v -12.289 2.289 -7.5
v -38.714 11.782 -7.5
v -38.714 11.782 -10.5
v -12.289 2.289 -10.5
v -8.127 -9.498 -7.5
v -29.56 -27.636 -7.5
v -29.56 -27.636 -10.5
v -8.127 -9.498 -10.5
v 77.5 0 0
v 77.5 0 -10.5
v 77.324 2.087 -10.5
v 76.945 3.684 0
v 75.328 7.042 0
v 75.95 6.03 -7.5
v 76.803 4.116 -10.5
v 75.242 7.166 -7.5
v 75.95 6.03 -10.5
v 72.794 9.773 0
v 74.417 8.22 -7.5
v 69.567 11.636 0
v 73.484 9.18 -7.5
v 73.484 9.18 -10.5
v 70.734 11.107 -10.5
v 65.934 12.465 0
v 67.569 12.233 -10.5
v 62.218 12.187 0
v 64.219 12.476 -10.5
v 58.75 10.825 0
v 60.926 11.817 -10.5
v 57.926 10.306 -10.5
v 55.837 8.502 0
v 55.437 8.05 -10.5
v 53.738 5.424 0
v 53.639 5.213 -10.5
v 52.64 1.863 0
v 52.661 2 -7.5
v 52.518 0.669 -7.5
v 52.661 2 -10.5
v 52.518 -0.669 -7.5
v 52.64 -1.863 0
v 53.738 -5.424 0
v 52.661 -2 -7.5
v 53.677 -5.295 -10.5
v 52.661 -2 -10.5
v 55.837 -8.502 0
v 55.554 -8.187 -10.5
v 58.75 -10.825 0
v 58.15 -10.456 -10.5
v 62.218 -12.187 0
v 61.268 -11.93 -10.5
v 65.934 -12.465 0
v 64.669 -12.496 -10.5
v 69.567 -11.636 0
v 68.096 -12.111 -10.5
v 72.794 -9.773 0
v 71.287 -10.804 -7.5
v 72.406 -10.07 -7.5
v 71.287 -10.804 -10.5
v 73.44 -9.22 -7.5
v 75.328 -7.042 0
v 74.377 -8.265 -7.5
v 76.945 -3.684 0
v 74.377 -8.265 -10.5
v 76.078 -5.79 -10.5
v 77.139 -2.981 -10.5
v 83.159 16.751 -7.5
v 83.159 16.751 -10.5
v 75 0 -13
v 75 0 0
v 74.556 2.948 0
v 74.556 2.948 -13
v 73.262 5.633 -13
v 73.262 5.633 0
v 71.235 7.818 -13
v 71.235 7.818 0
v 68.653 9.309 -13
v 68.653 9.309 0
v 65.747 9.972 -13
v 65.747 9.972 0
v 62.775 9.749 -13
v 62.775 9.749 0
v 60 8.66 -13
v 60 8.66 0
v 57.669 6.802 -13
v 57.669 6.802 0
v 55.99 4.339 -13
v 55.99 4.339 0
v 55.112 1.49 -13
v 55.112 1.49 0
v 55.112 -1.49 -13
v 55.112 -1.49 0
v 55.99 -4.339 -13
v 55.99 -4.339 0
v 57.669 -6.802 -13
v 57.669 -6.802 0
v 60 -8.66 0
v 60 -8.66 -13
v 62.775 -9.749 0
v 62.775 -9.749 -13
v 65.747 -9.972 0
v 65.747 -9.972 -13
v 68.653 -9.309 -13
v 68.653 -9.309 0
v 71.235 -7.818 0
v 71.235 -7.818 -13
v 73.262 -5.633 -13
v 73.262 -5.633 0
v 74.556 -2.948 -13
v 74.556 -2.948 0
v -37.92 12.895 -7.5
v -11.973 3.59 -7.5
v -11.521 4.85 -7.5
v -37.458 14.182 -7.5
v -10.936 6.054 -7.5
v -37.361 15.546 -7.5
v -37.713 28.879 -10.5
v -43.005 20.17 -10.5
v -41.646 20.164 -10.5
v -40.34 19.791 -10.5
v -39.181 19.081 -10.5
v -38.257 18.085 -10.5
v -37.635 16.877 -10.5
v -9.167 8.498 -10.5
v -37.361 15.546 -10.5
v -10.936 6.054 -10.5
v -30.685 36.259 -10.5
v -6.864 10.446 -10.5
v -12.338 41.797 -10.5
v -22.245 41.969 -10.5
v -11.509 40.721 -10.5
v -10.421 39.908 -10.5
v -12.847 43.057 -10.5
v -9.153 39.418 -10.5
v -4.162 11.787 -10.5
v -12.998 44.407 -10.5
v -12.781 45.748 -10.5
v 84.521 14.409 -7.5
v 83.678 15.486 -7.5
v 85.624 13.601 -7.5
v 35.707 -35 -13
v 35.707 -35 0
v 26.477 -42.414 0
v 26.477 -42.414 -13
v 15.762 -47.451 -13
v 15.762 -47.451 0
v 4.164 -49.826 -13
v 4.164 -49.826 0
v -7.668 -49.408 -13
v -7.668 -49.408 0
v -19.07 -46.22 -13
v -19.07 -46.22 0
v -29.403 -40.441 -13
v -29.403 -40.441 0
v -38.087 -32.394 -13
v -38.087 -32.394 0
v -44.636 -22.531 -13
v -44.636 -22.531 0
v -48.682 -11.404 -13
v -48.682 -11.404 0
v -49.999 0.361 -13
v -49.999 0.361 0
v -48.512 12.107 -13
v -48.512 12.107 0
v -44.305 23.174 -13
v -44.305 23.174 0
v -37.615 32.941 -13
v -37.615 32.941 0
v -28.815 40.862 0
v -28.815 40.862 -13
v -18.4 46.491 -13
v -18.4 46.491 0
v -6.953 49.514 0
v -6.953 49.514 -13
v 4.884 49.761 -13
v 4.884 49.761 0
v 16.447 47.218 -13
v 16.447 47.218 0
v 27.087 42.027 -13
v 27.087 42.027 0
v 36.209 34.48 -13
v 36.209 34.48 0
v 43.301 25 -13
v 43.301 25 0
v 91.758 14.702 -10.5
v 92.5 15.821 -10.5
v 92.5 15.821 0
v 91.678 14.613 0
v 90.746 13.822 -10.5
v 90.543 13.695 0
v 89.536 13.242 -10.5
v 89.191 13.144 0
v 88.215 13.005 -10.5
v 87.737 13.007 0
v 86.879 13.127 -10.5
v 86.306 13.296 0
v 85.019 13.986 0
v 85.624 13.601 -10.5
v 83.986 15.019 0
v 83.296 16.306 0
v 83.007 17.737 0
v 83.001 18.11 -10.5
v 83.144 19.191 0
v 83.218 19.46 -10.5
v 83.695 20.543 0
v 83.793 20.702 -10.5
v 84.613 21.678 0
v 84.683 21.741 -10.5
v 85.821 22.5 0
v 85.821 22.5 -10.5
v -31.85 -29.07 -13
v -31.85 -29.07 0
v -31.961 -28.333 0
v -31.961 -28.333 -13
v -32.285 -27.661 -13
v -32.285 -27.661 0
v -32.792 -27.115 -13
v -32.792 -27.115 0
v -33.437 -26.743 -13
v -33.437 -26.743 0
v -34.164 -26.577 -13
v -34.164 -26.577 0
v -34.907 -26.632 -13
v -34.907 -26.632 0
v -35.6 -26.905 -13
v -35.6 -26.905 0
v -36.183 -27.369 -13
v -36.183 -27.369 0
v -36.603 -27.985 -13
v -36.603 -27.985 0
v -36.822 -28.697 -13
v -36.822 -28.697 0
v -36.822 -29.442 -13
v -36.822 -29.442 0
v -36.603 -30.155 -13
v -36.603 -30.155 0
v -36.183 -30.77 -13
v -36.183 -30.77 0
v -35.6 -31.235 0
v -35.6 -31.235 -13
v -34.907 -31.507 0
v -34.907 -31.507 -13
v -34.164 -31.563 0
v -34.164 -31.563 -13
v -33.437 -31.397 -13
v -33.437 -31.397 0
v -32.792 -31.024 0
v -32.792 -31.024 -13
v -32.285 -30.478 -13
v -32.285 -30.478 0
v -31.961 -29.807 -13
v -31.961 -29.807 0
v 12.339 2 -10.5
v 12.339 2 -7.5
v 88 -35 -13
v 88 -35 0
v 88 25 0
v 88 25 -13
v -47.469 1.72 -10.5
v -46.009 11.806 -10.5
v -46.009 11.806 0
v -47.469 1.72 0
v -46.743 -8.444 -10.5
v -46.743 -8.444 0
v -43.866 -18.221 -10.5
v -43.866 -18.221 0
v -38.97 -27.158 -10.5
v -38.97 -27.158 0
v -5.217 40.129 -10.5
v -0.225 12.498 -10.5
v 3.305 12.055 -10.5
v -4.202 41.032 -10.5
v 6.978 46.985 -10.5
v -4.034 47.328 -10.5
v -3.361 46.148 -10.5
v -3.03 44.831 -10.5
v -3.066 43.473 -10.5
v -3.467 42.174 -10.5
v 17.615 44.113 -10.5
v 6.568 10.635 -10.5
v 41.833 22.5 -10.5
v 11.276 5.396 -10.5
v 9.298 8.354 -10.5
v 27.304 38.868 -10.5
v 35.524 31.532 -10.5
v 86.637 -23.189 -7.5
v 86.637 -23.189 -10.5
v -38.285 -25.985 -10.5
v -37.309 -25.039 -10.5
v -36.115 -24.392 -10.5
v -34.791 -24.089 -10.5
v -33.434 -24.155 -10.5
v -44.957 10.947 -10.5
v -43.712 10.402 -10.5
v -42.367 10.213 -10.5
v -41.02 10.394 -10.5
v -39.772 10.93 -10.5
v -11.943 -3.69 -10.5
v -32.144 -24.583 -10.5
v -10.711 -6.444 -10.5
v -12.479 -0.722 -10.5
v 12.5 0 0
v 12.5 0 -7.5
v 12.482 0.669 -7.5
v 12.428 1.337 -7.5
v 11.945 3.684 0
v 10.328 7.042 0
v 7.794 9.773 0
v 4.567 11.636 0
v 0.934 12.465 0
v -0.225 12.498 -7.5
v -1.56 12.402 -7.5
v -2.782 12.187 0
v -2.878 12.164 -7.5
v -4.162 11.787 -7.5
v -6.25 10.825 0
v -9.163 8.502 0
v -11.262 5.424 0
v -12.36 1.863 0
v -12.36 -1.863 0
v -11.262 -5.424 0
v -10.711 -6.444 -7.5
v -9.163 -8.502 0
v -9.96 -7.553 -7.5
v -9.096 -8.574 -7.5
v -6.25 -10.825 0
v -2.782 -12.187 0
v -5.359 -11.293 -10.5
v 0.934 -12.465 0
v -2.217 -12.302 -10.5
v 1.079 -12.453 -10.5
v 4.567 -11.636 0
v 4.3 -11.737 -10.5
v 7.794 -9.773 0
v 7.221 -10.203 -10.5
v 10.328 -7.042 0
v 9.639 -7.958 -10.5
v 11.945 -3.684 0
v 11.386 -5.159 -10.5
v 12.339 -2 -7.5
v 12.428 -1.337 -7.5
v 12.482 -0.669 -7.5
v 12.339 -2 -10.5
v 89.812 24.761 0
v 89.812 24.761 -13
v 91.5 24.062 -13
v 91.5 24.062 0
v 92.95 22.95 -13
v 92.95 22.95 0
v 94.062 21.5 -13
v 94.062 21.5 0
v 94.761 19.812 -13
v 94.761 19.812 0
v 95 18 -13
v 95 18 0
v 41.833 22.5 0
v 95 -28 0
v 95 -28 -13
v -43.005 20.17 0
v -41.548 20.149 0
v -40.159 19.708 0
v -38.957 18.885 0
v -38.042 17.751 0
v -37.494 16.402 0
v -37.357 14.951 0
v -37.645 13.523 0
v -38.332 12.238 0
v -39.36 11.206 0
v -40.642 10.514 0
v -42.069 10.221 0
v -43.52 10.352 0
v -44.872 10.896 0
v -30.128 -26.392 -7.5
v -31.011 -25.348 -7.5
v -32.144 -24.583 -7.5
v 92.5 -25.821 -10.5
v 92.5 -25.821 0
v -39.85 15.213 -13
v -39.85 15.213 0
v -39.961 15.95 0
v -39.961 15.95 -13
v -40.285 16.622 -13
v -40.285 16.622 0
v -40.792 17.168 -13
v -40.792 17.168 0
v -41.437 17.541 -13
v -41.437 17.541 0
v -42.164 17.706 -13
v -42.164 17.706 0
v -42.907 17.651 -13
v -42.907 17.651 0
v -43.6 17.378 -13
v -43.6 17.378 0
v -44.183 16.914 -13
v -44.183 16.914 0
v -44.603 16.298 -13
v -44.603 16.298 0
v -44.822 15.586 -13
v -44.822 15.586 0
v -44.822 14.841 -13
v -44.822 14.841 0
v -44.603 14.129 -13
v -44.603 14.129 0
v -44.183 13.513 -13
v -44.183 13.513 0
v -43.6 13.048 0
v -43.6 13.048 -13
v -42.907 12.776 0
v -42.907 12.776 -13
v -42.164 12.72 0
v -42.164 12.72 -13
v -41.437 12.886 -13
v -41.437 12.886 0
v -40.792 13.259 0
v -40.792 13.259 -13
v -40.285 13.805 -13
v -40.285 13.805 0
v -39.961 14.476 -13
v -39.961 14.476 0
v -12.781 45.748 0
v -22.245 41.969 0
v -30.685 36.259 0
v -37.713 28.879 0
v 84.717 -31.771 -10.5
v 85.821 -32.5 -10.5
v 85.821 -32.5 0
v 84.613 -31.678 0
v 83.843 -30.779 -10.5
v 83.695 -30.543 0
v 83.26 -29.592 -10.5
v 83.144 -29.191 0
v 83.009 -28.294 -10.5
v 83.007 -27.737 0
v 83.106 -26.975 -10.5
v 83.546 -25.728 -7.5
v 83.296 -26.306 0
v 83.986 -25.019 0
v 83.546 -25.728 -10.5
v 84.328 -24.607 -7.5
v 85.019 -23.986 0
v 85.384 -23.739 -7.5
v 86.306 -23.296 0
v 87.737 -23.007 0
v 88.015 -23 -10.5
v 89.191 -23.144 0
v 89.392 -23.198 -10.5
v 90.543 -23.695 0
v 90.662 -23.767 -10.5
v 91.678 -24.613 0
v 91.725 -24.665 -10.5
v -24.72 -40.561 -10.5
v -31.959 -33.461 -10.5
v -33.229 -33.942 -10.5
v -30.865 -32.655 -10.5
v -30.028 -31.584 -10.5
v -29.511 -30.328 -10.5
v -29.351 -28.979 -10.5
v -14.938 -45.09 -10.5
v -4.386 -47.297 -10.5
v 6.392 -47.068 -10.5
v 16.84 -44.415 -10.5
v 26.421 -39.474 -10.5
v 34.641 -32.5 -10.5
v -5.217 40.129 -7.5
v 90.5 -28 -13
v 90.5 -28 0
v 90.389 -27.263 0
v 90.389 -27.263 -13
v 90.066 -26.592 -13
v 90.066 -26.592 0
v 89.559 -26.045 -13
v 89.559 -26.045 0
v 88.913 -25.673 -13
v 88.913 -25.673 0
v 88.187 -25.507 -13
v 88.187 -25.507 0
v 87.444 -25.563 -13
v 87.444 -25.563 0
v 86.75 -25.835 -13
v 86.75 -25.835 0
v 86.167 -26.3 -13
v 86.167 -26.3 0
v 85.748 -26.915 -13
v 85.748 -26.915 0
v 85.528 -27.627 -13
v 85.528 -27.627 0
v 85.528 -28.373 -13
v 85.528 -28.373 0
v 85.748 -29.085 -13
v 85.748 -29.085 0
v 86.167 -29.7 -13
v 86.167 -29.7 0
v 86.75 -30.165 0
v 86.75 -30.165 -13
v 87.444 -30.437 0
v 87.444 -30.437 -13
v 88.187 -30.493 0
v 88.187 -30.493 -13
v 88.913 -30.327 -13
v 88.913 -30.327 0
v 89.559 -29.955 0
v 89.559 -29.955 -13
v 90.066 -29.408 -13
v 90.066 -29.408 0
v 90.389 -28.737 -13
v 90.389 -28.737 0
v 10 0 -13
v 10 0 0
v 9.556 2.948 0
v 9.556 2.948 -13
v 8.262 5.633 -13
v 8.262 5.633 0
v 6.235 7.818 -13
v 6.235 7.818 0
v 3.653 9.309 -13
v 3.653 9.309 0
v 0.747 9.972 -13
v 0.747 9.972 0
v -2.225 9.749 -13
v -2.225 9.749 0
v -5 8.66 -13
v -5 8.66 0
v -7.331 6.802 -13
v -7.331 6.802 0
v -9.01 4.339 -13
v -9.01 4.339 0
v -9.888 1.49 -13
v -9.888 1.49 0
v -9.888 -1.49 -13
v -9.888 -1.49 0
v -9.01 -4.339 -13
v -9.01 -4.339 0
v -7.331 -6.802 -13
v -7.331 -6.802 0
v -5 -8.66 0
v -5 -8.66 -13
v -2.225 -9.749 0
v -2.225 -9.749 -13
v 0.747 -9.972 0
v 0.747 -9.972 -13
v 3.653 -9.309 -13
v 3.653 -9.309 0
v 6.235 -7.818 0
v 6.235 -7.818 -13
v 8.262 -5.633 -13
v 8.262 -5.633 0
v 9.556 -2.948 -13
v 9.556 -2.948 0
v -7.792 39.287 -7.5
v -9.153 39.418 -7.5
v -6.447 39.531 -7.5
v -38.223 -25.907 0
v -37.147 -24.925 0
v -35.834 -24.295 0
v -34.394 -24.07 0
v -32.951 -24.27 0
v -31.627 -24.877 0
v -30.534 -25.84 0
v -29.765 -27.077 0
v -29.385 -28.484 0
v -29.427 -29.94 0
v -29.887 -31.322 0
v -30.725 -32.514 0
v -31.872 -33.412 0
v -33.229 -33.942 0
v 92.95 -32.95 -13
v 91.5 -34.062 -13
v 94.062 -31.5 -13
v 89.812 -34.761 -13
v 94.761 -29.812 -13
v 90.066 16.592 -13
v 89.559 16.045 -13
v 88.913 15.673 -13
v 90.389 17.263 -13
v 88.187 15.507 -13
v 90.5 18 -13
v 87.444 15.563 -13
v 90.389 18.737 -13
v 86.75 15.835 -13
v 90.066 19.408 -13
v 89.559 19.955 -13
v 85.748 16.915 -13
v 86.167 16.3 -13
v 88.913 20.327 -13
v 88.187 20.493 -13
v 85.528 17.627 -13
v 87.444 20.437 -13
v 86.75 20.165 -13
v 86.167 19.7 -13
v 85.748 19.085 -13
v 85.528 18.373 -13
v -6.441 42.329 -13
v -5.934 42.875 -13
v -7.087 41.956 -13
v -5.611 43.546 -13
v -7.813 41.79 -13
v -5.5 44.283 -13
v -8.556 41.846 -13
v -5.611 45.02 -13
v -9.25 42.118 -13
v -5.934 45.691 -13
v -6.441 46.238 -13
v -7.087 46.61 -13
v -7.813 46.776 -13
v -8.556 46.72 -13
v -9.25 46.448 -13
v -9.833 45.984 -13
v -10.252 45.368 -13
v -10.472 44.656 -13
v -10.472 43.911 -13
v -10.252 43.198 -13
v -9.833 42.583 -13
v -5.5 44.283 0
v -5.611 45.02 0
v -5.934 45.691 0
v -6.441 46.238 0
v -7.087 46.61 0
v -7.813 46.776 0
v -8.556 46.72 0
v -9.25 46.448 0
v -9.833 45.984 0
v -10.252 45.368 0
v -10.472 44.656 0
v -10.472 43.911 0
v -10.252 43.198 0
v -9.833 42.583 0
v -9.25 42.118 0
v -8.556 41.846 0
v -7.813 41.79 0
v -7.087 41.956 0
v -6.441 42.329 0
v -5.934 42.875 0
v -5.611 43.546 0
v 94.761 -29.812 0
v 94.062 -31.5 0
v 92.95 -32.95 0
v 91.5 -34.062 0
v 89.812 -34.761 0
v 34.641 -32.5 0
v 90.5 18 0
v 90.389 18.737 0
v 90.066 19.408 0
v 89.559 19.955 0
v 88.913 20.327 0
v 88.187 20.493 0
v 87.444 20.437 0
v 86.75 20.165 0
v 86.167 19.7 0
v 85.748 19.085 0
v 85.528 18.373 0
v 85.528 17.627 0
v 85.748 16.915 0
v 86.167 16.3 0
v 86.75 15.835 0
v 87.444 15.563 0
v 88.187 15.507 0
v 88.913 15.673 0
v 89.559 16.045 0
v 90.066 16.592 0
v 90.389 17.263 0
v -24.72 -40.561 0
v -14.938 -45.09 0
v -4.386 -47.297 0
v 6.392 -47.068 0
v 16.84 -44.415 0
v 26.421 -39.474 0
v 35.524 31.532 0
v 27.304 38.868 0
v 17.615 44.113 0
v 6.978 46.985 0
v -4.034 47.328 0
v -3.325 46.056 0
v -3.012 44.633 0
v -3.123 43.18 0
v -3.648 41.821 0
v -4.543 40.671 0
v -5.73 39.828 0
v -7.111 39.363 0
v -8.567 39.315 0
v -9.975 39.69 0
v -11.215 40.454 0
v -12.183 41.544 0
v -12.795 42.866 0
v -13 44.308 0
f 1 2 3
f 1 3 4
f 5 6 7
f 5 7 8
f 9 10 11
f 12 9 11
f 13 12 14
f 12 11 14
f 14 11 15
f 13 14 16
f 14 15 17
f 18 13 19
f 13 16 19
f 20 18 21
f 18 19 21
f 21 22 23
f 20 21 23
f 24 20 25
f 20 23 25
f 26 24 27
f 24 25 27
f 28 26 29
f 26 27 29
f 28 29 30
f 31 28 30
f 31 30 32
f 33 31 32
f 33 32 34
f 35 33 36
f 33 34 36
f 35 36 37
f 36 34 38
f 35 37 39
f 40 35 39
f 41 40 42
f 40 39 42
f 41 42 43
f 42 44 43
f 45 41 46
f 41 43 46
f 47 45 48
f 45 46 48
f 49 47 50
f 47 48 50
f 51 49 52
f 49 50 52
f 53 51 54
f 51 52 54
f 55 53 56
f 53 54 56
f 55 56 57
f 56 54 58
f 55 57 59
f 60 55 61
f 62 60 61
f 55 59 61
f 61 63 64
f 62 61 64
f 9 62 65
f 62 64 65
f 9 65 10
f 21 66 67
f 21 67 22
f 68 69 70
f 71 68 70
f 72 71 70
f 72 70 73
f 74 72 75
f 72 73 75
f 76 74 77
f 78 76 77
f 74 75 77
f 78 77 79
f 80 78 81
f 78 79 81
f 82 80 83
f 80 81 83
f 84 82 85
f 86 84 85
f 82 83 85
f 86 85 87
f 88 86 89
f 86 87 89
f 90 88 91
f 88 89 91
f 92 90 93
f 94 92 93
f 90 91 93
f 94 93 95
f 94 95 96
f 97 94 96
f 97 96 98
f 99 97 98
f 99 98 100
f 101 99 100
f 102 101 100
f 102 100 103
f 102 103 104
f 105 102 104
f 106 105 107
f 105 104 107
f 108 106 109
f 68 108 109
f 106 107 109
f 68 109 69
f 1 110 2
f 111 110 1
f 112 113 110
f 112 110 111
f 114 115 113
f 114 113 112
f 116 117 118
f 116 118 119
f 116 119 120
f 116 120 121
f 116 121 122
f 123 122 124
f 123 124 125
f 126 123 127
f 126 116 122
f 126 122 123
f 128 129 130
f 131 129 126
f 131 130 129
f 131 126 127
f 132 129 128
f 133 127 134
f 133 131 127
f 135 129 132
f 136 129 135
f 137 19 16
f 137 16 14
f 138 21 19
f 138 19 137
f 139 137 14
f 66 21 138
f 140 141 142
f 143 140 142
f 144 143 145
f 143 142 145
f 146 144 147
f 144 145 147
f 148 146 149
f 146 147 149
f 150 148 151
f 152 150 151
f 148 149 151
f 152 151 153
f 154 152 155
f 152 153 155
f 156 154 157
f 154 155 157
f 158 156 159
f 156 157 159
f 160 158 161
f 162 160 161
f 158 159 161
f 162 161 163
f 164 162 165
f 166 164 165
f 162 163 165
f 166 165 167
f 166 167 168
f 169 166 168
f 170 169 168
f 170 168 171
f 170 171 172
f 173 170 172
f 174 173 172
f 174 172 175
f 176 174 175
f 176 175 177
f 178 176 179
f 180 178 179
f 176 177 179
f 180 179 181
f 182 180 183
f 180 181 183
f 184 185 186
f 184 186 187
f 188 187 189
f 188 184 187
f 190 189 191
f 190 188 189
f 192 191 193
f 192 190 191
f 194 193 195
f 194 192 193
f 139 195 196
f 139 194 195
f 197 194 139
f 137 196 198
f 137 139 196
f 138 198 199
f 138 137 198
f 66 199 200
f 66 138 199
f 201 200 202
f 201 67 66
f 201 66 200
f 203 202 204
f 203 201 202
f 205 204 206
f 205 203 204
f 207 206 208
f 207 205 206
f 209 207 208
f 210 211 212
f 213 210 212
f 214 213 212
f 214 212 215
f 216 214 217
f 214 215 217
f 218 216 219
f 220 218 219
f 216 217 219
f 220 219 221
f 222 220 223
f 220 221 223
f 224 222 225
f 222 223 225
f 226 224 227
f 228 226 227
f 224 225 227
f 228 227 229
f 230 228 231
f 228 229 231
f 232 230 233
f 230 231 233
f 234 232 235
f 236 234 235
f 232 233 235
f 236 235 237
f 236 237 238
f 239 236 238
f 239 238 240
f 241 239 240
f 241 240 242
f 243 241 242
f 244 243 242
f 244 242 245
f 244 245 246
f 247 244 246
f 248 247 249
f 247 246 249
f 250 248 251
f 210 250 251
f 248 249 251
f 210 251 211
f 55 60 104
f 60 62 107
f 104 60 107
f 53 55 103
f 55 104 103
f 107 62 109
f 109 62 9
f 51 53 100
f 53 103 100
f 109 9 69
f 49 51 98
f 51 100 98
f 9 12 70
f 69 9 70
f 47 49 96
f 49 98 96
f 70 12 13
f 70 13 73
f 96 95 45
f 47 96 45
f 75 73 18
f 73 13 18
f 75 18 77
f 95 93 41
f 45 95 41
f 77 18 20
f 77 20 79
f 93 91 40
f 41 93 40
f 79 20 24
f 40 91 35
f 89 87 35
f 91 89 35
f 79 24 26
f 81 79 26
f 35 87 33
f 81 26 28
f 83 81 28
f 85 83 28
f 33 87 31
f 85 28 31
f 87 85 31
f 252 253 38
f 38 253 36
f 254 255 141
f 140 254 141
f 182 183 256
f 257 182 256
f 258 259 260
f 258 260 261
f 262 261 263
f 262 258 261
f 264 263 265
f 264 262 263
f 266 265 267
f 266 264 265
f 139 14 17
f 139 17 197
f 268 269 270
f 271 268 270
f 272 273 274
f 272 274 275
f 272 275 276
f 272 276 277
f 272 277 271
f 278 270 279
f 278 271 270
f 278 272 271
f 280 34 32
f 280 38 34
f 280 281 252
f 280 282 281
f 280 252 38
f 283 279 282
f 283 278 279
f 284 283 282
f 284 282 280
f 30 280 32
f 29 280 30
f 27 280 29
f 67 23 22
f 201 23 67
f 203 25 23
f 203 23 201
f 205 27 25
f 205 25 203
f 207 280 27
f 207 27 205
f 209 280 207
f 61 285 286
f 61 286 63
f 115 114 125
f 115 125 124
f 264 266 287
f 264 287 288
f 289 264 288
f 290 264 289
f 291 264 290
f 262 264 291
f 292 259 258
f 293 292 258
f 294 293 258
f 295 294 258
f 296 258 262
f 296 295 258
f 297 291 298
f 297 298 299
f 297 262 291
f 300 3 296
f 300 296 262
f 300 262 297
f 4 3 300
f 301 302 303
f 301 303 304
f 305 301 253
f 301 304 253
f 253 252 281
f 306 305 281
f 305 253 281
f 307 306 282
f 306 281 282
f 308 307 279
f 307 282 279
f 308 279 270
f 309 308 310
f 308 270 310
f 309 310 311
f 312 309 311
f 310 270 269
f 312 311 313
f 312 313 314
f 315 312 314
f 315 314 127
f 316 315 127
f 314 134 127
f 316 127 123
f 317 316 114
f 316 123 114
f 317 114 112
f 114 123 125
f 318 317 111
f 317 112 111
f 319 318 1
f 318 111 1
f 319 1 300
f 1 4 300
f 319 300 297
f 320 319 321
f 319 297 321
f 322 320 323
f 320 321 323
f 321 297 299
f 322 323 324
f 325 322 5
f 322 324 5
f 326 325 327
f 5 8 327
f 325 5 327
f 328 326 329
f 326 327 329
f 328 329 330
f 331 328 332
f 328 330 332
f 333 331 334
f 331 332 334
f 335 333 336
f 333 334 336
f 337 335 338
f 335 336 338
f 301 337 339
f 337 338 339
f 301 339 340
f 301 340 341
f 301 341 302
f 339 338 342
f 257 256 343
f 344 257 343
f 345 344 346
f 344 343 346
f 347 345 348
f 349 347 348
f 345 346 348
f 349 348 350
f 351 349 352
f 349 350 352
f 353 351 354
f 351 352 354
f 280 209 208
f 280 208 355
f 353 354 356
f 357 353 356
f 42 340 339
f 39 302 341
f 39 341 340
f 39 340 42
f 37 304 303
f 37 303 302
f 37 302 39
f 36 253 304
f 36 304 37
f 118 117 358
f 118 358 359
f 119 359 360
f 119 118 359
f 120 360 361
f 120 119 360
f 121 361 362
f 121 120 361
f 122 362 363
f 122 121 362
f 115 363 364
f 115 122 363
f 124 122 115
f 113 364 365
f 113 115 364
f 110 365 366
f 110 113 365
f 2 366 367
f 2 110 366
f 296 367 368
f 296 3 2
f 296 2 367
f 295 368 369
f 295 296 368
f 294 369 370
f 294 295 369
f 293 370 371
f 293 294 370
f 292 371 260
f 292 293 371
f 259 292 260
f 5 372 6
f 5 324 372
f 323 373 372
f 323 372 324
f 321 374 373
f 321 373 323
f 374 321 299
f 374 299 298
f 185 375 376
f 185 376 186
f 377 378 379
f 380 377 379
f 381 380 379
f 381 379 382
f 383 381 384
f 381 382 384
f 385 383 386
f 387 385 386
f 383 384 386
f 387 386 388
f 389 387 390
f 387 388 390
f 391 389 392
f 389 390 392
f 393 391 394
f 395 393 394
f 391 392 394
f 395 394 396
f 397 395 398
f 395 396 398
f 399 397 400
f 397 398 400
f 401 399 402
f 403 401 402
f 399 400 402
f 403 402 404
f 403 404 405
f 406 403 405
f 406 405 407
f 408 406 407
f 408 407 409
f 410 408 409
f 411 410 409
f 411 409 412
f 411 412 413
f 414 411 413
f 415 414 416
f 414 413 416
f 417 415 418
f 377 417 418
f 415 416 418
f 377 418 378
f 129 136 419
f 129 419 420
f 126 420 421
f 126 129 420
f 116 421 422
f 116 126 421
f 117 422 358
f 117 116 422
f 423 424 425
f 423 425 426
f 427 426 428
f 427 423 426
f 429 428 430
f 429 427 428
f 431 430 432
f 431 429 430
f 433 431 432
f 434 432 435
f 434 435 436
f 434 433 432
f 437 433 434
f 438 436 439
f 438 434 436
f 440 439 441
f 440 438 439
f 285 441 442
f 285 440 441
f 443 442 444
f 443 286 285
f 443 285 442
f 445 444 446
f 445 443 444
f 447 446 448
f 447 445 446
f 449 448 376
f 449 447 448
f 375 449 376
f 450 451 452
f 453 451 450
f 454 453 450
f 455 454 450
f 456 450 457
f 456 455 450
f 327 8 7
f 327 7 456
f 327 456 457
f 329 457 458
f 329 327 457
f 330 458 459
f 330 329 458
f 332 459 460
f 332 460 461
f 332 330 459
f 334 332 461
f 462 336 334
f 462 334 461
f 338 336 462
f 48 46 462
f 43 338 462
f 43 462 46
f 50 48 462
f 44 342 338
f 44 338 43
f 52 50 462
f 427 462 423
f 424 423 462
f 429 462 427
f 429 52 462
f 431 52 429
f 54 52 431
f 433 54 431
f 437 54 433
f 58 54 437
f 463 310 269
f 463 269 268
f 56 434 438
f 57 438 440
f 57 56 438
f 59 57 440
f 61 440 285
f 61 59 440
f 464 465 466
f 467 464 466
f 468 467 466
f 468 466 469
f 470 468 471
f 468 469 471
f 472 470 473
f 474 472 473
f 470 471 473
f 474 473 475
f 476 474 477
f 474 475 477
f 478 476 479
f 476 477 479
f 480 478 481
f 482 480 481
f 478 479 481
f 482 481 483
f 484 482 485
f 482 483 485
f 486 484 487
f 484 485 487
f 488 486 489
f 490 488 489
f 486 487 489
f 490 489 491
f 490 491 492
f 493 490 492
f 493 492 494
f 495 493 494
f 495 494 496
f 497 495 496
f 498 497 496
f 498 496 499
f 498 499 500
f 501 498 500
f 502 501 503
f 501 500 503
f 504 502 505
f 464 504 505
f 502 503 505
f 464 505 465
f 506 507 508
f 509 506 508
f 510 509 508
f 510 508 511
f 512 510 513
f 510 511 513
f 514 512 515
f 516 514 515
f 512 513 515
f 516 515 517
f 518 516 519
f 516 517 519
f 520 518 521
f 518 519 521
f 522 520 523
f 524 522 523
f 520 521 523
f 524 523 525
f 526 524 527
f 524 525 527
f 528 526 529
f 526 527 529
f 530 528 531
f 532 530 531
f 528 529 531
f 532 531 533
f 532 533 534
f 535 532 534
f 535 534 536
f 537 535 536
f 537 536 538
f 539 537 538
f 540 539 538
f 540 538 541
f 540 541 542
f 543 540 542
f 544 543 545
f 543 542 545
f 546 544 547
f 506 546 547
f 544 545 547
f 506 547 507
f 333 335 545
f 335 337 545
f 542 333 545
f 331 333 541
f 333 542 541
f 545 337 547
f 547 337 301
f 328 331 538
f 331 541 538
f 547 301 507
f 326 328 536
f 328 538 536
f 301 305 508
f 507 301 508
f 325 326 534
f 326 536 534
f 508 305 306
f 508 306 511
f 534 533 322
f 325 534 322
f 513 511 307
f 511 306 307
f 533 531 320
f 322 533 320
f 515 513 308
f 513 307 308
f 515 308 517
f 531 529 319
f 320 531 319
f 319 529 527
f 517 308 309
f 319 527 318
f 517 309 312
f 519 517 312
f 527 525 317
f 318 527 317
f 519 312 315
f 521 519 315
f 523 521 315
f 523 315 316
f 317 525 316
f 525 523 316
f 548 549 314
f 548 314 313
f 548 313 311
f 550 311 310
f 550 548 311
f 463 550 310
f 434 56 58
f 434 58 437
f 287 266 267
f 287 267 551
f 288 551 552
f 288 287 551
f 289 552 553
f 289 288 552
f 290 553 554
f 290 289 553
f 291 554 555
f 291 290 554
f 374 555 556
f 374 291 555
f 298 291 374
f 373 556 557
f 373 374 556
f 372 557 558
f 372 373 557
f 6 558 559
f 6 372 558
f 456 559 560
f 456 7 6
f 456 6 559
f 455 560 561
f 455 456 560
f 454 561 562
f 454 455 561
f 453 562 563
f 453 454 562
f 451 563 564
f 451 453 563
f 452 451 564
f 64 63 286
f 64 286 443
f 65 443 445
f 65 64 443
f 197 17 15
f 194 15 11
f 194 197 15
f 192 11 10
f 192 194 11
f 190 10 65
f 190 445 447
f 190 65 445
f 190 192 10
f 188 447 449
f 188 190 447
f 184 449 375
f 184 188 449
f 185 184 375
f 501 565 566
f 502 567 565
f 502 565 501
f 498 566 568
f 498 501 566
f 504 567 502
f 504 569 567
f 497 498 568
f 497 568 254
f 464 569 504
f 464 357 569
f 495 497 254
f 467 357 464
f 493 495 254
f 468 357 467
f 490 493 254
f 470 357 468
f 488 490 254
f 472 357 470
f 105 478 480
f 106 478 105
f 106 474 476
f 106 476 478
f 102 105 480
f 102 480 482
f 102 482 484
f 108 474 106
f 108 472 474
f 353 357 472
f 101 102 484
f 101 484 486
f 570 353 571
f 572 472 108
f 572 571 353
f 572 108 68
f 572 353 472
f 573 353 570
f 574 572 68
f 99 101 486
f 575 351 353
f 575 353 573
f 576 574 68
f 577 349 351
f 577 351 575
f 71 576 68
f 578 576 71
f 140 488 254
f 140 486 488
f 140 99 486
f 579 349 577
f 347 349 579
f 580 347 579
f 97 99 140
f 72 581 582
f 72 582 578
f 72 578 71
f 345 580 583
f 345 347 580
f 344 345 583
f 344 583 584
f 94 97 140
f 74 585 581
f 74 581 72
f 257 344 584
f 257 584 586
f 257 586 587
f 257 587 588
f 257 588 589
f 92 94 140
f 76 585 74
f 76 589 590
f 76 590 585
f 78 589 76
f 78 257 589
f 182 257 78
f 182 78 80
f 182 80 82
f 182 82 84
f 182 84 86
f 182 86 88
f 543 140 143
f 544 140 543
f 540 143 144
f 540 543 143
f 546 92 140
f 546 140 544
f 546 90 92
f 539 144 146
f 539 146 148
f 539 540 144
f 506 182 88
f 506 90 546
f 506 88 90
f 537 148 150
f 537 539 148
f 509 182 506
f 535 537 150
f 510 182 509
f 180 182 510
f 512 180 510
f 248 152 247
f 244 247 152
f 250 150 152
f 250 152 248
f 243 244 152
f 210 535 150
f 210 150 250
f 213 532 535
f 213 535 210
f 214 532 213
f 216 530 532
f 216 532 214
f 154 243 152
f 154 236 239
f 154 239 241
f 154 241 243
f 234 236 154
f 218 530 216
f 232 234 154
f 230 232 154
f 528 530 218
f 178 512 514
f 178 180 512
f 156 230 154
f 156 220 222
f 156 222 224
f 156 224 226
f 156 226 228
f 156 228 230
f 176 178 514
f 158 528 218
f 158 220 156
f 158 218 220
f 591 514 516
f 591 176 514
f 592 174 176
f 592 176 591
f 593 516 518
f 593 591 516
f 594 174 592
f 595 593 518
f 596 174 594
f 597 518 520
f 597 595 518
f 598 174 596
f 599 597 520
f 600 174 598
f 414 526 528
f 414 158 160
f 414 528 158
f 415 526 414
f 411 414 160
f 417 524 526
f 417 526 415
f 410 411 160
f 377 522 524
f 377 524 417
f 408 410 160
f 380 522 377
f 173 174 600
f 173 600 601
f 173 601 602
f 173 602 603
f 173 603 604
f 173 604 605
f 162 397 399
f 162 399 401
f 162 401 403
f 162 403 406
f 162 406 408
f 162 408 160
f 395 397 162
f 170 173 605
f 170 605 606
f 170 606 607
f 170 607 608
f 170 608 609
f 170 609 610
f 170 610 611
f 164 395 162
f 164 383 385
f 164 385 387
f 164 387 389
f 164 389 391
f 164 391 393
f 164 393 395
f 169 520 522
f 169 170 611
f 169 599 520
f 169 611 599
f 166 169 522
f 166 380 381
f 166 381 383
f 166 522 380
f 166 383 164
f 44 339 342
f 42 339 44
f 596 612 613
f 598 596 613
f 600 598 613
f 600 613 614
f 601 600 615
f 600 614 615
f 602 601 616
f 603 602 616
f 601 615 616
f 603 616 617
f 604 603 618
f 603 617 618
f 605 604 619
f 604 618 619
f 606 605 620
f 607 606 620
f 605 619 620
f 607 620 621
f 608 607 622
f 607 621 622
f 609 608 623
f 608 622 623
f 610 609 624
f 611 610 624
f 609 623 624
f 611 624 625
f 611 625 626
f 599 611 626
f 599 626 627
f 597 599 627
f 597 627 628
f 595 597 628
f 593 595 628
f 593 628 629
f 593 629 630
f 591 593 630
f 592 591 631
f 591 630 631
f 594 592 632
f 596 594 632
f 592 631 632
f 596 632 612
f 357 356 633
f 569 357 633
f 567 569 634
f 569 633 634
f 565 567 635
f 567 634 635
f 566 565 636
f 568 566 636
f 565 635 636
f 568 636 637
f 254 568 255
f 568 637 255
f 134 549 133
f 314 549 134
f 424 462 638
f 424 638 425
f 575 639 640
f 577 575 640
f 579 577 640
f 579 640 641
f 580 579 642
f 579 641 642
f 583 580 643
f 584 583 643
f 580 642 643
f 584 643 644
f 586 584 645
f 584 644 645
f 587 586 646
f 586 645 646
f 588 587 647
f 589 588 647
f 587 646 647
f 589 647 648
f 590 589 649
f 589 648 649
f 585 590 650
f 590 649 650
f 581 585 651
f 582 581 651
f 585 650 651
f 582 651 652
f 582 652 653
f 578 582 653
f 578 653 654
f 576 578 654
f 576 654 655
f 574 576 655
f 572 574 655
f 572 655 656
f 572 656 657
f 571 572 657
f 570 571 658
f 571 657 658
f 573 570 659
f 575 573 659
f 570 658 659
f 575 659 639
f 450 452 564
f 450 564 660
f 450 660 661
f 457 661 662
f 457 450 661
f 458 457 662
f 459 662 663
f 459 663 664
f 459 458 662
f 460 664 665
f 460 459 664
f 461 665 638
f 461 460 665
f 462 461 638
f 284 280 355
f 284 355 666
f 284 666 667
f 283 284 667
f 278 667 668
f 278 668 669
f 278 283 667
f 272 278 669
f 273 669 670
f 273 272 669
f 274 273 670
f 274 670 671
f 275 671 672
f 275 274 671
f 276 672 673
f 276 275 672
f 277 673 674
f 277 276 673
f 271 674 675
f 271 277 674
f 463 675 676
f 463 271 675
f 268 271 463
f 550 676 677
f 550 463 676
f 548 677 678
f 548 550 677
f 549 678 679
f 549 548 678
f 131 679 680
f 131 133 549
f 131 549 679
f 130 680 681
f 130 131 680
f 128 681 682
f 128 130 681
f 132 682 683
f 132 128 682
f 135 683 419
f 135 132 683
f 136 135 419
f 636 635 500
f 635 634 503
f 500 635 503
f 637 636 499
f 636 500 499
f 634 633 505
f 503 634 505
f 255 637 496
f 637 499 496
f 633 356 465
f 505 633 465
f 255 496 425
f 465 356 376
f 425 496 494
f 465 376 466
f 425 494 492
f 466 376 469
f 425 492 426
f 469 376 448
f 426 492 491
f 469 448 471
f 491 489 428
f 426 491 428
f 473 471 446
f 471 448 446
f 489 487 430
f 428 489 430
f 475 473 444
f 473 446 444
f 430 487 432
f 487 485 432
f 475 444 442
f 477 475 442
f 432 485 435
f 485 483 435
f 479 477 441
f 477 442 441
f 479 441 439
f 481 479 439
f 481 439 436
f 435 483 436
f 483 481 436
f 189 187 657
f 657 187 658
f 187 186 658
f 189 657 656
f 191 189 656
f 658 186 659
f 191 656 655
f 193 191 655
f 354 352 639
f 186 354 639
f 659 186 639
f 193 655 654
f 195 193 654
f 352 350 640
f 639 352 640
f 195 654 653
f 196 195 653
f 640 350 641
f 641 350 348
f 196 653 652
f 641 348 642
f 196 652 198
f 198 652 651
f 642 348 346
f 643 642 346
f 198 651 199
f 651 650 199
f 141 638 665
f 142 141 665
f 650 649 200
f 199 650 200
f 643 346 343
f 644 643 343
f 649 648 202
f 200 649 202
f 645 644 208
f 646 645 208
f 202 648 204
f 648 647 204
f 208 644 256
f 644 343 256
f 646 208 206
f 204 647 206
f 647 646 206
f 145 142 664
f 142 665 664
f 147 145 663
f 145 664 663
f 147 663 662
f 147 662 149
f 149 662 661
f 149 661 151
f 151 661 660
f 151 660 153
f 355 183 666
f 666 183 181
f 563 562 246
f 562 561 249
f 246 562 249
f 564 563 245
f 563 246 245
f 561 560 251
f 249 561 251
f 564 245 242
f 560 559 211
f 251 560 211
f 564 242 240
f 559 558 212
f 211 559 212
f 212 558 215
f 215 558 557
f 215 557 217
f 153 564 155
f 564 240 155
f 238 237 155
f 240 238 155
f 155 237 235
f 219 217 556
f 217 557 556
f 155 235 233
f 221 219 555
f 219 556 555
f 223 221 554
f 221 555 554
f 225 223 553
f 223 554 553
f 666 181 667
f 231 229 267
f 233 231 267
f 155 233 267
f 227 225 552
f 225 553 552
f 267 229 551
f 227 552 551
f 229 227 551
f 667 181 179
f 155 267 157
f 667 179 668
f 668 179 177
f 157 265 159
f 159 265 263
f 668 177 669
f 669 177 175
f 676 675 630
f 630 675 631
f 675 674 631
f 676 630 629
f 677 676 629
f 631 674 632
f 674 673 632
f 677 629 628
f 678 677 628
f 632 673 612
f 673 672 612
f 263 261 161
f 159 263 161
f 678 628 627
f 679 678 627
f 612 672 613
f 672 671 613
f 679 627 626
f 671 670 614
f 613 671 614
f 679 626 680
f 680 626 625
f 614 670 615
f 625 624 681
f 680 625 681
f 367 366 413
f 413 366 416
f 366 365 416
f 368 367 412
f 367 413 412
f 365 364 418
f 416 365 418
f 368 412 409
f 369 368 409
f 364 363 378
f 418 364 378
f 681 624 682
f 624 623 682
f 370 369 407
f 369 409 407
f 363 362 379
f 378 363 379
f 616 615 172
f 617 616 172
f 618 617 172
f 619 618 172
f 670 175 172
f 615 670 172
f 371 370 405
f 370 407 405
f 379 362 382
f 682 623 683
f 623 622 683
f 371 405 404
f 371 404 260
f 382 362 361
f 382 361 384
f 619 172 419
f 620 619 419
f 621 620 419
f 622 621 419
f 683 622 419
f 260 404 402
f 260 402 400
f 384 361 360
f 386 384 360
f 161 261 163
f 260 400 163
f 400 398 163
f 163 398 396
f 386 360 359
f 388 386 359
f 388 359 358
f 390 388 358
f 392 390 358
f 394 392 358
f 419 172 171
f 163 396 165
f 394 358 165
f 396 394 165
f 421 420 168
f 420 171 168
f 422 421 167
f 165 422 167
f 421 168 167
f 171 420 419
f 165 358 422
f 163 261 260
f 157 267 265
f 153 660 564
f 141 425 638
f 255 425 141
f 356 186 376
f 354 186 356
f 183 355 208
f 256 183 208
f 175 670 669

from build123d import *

# Parameters (mm, degrees)
SKETCH1_R        = 10
SKETCH1_R_2      = 2.5
EXTRUDE1_DEPTH   = 13
SHELL1_START     = -10.5
SHELL1_OUTLINE_R = 12.5
SHELL1_DEPTH     = 10.5
RIB1_REACH       = 109.616
SKETCH2_WALLS_W  = 262.2324325
SKETCH2_WALLS_H  = 4


# Read off the part's stored shape, not the designer's step: Shell1
with BuildPart() as part:
    # Sketch1 → Extrude1 (new body)
    with BuildSketch(Plane.XY):
        with BuildLine():
            Line((43.301270189, 25), (88, 25))
            ThreePointArc((88, 25), (92.949747468, 22.949747468), (95, 18))
            Line((95, 18), (95, -28))
            ThreePointArc((95, -28), (92.949747468, -32.949747468), (88, -35))
            Line((88, -35), (35.707142143, -35))
            ThreePointArc((35.707142143, -35), (-49.604256922, 6.278351312), (43.301270189, 25))
        make_face()
        Circle(SKETCH1_R, mode=Mode.SUBTRACT)
        with Locations((65, 0)):
            Circle(SKETCH1_R, mode=Mode.SUBTRACT)
        with Locations((-8, 44.283179651)):
            Circle(SKETCH1_R_2, mode=Mode.SUBTRACT)
        with Locations((-42.350358538, 15.213386595)):
            Circle(SKETCH1_R_2, mode=Mode.SUBTRACT)
        with Locations((-34.350358538, -29.069793056)):
            Circle(SKETCH1_R_2, mode=Mode.SUBTRACT)
        with Locations((88, 18)):
            Circle(SKETCH1_R_2, mode=Mode.SUBTRACT)
        with Locations((88, -28)):
            Circle(SKETCH1_R_2, mode=Mode.SUBTRACT)
    extrude(amount=-EXTRUDE1_DEPTH)

    # Shell1 outline → Shell1 (cut)
    with BuildSketch(Plane.XY.offset(SHELL1_START)):
        with BuildLine():
            ThreePointArc((-43.004716488, 20.170383234), (-37.644763145, 13.523010307), (-46.009463032, 11.805901554))
            ThreePointArc((-46.009463032, 11.805901554), (-46.743356298, -8.444444445), (-38.970422528, -27.157985344))
            ThreePointArc((-38.970422528, -27.157985344), (-30.533652034, -25.83981605), (-33.228942177, -33.942413023))
            ThreePointArc((-33.228942177, -33.942413023), (1.009270558, -47.489276399), (34.641016151, -32.5))
            Line((34.641016151, -32.5), (85.820550528, -32.5))
            ThreePointArc((85.820550528, -32.5), (84.464466094, -24.464466094), (92.5, -25.820550528))
            Line((92.5, -25.820550528), (92.5, 15.820550528))
            ThreePointArc((92.5, 15.820550528), (84.464466094, 14.464466094), (85.820550528, 22.5))
            Line((85.820550528, 22.5), (41.833001327, 22.5))
            ThreePointArc((41.833001327, 22.5), (22.611889377, 41.772628105), (-4.03429396, 47.328368578))
            ThreePointArc((-4.03429396, 47.328368578), (-7.111111111, 39.362826356), (-12.780520855, 45.748314577))
            ThreePointArc((-12.780520855, 45.748314577), (-30.684781559, 36.25871179), (-43.004716488, 20.170383234))
        make_face()
        Circle(SHELL1_OUTLINE_R, mode=Mode.SUBTRACT)
        with Locations((65, 0)):
            Circle(SHELL1_OUTLINE_R, mode=Mode.SUBTRACT)
    extrude(amount=SHELL1_DEPTH, mode=Mode.SUBTRACT)

    # Sketch2 walls → Rib1 (add, up to next)
    with BuildSketch(Plane.XY.offset(-7.5), mode=Mode.PRIVATE) as rib1_sk1:
        Polygon((-29.277690873, 150.813655589), (15.56363046, -97.40088046), (19.499913096, -96.689769349), (-25.341408238, 151.5247667), align=None)
    rib1_tool1 = extrude(rib1_sk1.sketch, amount=-RIB1_REACH, mode=Mode.PRIVATE) - part.part
    # Sketch2 walls → Rib1 (add, up to next)
    with BuildSketch(Plane.XY.offset(-7.5), mode=Mode.PRIVATE) as rib1_sk2:
        Polygon((93.48575309, -31.457464562), (-143.895001384, 53.816080049), (-145.247302414, 50.051603734), (92.133452059, -35.221940877), align=None)
    rib1_tool2 = extrude(rib1_sk2.sketch, amount=-RIB1_REACH, mode=Mode.PRIVATE) - part.part
    # Sketch2 walls → Rib1 (add, up to next)
    with BuildSketch(Plane.XY.offset(-7.5), mode=Mode.PRIVATE) as rib1_sk3:
        Polygon((-115.969611541, -100.762051855), (76.569821599, 62.178939584), (73.985839994, 65.232304787), (-118.553593146, -97.708686652), align=None)
    rib1_tool3 = extrude(rib1_sk3.sketch, amount=-RIB1_REACH, mode=Mode.PRIVATE) - part.part
    # Sketch2 walls → Rib1 (add, up to next)
    with BuildSketch(Plane.XY.offset(-7.5), mode=Mode.PRIVATE) as rib1_sk4:
        with Locations((32.5, 0)):
            Rectangle(SKETCH2_WALLS_W, SKETCH2_WALLS_H)
    rib1_tool4 = extrude(rib1_sk4.sketch, amount=-RIB1_REACH, mode=Mode.PRIVATE) - part.part
    # Sketch2 walls → Rib1 (add, up to next)
    with BuildSketch(Plane.XY.offset(-7.5), mode=Mode.PRIVATE) as rib1_sk5:
        Polygon((-11.428146954, -62.35299881), (174.768430011, 83.366061423), (172.303196964, 86.516081427), (-13.893380001, -59.202978806), align=None)
    rib1_tool5 = extrude(rib1_sk5.sketch, amount=-RIB1_REACH, mode=Mode.PRIVATE) - part.part
    # Sketch2 walls → Rib1 (add, up to next)
    with BuildSketch(Plane.XY.offset(-7.5), mode=Mode.PRIVATE) as rib1_sk6:
        Polygon((0.858947254, 74.933860572), (155.397541961, -113.20008081), (158.488446979, -110.661123117), (3.949852272, 77.472818265), align=None)
    rib1_tool6 = extrude(rib1_sk6.sketch, amount=-RIB1_REACH, mode=Mode.PRIVATE) - part.part
    add(rib1_tool1.solids().sort_by_distance((-4.888888889, 27.06194312, -7.5))[0])
    add(rib1_tool2.solids().sort_by_distance((-25.880774662, 9.297069586, -7.5))[0])
    add(rib1_tool3.solids().sort_by_distance((-20.991885773, -17.764873534, -7.5))[0])
    add(rib1_tool4.solids().sort_by_distance((32.5, 0, -7.5))[0])
    add(rib1_tool5.solids().sort_by_distance((80.437525005, 12.081541308, -7.5))[0])
    add(rib1_tool6.solids().sort_by_distance((79.673697117, -17.863631273, -7.5))[0])


solid = part.part
